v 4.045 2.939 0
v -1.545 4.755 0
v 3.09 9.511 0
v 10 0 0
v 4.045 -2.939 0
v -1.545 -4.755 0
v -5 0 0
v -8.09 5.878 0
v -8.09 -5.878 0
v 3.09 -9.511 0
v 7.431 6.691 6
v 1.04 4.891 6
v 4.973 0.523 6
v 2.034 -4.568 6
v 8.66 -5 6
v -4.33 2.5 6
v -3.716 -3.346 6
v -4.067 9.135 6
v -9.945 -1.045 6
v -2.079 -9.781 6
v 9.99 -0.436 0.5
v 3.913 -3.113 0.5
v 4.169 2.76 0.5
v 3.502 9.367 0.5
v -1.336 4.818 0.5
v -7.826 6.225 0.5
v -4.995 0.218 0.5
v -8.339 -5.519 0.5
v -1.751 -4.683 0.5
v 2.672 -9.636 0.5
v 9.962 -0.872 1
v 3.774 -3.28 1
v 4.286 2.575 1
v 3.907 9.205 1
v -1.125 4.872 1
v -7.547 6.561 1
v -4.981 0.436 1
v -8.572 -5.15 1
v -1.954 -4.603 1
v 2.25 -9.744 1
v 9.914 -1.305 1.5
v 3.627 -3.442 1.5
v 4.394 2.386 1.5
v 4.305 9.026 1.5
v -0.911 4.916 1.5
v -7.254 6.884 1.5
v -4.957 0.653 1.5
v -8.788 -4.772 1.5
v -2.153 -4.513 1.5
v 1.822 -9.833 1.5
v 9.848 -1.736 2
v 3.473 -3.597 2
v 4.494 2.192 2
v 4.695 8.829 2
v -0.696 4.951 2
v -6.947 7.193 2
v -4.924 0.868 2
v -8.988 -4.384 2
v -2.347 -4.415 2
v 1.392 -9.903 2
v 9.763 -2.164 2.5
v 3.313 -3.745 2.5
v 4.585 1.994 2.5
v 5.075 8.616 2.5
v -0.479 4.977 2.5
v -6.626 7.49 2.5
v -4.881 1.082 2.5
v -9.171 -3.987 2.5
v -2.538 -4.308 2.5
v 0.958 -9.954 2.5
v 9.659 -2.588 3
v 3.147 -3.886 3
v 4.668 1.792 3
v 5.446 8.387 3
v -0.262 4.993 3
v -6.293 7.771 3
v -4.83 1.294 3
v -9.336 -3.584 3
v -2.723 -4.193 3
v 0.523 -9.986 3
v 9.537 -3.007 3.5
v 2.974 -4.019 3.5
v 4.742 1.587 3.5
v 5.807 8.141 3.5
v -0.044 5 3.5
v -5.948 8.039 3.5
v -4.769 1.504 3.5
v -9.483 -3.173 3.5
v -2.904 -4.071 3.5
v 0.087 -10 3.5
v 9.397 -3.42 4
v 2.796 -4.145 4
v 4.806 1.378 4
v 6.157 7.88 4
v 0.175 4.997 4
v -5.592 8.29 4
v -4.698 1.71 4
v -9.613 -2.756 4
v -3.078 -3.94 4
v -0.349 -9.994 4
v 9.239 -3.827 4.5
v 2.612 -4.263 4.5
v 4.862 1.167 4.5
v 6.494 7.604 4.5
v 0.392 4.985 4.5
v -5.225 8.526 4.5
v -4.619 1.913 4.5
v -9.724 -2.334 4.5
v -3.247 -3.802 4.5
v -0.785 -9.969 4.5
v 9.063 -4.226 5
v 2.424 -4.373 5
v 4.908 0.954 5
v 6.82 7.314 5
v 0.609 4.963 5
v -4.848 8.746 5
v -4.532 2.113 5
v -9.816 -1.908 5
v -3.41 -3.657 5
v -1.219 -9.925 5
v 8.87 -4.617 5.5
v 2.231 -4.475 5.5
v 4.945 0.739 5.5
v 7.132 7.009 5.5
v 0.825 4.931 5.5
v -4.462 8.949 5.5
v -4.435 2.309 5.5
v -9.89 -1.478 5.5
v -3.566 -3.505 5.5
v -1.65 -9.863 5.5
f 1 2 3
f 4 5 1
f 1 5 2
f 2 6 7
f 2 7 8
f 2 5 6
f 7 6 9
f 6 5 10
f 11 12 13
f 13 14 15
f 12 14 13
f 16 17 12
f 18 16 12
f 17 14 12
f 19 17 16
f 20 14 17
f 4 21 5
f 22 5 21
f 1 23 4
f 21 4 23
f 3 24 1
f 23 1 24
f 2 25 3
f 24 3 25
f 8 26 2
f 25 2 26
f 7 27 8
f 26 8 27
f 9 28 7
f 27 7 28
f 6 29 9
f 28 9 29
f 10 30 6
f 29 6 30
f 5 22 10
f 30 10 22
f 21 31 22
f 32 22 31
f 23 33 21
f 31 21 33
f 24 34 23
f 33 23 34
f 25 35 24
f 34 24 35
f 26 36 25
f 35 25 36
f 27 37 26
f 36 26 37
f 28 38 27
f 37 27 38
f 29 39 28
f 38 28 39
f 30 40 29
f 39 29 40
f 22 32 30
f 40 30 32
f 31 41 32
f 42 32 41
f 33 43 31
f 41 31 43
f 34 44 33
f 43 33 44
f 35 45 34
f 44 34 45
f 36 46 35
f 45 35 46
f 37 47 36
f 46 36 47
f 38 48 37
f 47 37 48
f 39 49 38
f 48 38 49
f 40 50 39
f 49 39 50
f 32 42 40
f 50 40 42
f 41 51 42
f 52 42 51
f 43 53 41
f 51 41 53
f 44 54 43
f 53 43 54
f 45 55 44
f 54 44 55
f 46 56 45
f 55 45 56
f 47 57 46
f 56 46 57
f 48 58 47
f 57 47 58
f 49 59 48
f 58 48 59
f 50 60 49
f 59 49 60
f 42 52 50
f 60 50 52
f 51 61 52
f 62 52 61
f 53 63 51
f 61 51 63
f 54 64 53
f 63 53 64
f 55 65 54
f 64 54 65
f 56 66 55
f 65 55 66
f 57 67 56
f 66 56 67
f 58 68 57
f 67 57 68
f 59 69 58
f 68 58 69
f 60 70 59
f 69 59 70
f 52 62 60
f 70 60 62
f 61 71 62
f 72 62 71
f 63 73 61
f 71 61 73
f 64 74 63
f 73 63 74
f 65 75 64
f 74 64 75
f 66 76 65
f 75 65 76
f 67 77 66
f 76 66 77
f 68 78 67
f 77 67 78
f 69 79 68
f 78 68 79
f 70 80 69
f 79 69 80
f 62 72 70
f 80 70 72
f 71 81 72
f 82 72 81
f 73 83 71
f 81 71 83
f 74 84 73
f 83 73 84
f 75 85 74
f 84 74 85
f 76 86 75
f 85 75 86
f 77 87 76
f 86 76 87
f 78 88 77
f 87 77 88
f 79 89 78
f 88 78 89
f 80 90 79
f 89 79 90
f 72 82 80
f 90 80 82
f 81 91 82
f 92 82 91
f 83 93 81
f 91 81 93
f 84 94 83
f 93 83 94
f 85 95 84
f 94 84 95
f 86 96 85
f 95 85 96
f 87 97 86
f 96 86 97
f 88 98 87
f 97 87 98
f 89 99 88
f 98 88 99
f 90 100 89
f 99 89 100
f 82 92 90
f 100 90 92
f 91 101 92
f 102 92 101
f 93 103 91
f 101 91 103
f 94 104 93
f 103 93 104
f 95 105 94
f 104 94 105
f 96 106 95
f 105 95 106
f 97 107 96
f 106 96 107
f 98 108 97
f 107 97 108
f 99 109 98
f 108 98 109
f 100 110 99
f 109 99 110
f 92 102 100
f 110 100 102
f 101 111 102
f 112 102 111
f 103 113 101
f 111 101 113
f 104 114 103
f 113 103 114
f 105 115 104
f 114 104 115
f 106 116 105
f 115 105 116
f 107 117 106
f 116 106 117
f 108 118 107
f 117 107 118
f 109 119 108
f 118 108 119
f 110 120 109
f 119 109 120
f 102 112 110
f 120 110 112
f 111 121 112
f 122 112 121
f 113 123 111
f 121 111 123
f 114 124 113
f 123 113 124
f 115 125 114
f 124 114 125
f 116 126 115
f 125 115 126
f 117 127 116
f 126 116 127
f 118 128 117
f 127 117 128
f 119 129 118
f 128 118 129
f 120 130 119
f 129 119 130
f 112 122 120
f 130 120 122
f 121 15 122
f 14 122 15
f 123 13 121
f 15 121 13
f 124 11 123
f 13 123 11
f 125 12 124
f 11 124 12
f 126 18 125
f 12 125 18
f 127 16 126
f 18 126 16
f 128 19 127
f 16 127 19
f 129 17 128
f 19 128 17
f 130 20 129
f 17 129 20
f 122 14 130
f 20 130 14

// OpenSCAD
// Exercises the extrude family plus hull/minkowski, the parts of the language
// an agent is most likely to get subtly wrong.
module star(n = 5, r = 10) {
    polygon(concat(
        [for (i = [0 : 2 * n - 1])
            let (a = i * 180 / n, rr = (i % 2 == 0) ? r : r / 2)
            [rr * cos(a), rr * sin(a)]]
    ));
}

linear_extrude(height = 6, twist = 30, slices = 12) star();
